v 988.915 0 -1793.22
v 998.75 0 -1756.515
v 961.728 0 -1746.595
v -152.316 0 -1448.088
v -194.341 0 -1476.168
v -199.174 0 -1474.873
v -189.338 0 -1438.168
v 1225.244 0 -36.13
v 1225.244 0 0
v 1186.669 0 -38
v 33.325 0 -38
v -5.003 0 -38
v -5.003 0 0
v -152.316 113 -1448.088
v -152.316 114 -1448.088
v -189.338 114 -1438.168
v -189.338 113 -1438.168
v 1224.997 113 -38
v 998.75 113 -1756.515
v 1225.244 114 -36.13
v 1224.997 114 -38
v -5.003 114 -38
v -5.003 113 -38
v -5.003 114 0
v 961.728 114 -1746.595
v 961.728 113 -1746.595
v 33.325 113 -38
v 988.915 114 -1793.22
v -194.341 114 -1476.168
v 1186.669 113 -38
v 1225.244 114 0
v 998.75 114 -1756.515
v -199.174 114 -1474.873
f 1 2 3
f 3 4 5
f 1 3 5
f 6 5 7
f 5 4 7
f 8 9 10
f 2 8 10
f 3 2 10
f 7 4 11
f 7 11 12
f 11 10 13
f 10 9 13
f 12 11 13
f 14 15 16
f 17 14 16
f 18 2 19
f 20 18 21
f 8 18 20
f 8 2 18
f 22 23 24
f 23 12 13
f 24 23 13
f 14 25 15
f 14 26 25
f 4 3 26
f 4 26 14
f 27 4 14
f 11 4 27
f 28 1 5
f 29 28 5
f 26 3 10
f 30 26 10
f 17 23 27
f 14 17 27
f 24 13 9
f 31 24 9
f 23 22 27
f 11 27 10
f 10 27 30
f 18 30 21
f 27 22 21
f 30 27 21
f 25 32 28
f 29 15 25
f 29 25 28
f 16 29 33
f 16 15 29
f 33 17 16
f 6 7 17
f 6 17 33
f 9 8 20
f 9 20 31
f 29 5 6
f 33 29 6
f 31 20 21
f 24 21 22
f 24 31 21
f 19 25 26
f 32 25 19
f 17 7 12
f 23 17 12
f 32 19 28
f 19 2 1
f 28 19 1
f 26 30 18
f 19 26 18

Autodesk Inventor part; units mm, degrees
ref_plane "YZ Plane" through (0, 0, 0) normal (1, 0, 0) x (0, 1, 0)
ref_plane "XZ Plane" through (0, 0, 0) normal (0, 1, 0) x (-1, 0, 0)
ref_plane "XY Plane" through (0, 0, 0) normal (0, 0, 1) x (1, 0, 0)
sketch "Sketch1" plane through (0, 0, 0) normal (0, 1, 0) x (-1, 0, 0)
  line L0 (-988.9153, -1793.2204) -> (194.3412, -1476.1678)
  line L1 (189.3384, -1438.1678) -> (5.0028, -38)
  line L2 (-998.7504, -1756.5152) -> (-1225.2435, -36.1295)
  line L3 (-961.7285, -1746.5952) -> (152.3165, -1448.0878)
  line L4 (152.3165, -1448.0878) -> (-33.3251, -38)
  line L5 (-33.3251, -38) -> (-1186.6693, -38)
  line L6 (-961.7285, -1746.5952) -> (-1186.6693, -38)
  line L7 (-998.7504, -1756.5152) -> (-988.9153, -1793.2204)
  line L8 (-1225.2435, -36.1295) -> (-1225.2435, 0)
  line L9 (189.3384, -1438.1678) -> (199.1735, -1474.873)
  line L10 (194.3412, -1476.1678) -> (199.1735, -1474.873)
  line L11 (5.0028, -38) -> (5.0028, 0)
  line L12 (5.0028, 0) -> (-1225.2435, 0)
  dimension "d7" = 38
  dimension "d8" = 38
extrude "Extrusion1" add sketch "Sketch1" along normal blind 114
sketch "Sketch2" plane through (0, 114, 0) normal (0, 1, 0) x (1, 0, 0)
  line L0 (33.3251, 38) -> (-152.3165, 1448.0878) projected
  line L1 (-189.3384, 1438.1678) -> (-5.0028, 38) projected
  line L2 (-5.0028, 38) -> (-5.0028, 0) projected
  line L3 (998.7504, 1756.5152) -> (988.9153, 1793.2204) projected
  line L4 (-152.3165, 1448.0878) -> (-189.3384, 1438.1678)
  line L5 (33.3251, 38) -> (-5.0028, 38)
  point P0 (0, 0)
extrude "Extrusion2" cut sketch "Sketch2" against normal blind 1
sketch "Sketch4" plane through (0, 114, 0) normal (0, 1, 0) x (1, 0, 0)
  line L0 (961.7285, 1746.5952) -> (1186.6693, 38) projected
  line L1 (1225.2435, 0) -> (1225.2435, 36.1295) projected
  line L2 (1225.2435, 36.1295) -> (998.7504, 1756.5152) projected
  line L3 (-199.1735, 1474.873) -> (-189.3384, 1438.1678) projected
  line L4 (961.7285, 1746.5952) -> (998.7504, 1756.5152)
  line L5 (1186.6693, 38) -> (1224.9972, 38)
  point P0 (0, 0)
extrude "Extrusion4" cut sketch "Sketch4" against normal blind 1
properties part number "panelDframe" material "Wood (Cherry)"
